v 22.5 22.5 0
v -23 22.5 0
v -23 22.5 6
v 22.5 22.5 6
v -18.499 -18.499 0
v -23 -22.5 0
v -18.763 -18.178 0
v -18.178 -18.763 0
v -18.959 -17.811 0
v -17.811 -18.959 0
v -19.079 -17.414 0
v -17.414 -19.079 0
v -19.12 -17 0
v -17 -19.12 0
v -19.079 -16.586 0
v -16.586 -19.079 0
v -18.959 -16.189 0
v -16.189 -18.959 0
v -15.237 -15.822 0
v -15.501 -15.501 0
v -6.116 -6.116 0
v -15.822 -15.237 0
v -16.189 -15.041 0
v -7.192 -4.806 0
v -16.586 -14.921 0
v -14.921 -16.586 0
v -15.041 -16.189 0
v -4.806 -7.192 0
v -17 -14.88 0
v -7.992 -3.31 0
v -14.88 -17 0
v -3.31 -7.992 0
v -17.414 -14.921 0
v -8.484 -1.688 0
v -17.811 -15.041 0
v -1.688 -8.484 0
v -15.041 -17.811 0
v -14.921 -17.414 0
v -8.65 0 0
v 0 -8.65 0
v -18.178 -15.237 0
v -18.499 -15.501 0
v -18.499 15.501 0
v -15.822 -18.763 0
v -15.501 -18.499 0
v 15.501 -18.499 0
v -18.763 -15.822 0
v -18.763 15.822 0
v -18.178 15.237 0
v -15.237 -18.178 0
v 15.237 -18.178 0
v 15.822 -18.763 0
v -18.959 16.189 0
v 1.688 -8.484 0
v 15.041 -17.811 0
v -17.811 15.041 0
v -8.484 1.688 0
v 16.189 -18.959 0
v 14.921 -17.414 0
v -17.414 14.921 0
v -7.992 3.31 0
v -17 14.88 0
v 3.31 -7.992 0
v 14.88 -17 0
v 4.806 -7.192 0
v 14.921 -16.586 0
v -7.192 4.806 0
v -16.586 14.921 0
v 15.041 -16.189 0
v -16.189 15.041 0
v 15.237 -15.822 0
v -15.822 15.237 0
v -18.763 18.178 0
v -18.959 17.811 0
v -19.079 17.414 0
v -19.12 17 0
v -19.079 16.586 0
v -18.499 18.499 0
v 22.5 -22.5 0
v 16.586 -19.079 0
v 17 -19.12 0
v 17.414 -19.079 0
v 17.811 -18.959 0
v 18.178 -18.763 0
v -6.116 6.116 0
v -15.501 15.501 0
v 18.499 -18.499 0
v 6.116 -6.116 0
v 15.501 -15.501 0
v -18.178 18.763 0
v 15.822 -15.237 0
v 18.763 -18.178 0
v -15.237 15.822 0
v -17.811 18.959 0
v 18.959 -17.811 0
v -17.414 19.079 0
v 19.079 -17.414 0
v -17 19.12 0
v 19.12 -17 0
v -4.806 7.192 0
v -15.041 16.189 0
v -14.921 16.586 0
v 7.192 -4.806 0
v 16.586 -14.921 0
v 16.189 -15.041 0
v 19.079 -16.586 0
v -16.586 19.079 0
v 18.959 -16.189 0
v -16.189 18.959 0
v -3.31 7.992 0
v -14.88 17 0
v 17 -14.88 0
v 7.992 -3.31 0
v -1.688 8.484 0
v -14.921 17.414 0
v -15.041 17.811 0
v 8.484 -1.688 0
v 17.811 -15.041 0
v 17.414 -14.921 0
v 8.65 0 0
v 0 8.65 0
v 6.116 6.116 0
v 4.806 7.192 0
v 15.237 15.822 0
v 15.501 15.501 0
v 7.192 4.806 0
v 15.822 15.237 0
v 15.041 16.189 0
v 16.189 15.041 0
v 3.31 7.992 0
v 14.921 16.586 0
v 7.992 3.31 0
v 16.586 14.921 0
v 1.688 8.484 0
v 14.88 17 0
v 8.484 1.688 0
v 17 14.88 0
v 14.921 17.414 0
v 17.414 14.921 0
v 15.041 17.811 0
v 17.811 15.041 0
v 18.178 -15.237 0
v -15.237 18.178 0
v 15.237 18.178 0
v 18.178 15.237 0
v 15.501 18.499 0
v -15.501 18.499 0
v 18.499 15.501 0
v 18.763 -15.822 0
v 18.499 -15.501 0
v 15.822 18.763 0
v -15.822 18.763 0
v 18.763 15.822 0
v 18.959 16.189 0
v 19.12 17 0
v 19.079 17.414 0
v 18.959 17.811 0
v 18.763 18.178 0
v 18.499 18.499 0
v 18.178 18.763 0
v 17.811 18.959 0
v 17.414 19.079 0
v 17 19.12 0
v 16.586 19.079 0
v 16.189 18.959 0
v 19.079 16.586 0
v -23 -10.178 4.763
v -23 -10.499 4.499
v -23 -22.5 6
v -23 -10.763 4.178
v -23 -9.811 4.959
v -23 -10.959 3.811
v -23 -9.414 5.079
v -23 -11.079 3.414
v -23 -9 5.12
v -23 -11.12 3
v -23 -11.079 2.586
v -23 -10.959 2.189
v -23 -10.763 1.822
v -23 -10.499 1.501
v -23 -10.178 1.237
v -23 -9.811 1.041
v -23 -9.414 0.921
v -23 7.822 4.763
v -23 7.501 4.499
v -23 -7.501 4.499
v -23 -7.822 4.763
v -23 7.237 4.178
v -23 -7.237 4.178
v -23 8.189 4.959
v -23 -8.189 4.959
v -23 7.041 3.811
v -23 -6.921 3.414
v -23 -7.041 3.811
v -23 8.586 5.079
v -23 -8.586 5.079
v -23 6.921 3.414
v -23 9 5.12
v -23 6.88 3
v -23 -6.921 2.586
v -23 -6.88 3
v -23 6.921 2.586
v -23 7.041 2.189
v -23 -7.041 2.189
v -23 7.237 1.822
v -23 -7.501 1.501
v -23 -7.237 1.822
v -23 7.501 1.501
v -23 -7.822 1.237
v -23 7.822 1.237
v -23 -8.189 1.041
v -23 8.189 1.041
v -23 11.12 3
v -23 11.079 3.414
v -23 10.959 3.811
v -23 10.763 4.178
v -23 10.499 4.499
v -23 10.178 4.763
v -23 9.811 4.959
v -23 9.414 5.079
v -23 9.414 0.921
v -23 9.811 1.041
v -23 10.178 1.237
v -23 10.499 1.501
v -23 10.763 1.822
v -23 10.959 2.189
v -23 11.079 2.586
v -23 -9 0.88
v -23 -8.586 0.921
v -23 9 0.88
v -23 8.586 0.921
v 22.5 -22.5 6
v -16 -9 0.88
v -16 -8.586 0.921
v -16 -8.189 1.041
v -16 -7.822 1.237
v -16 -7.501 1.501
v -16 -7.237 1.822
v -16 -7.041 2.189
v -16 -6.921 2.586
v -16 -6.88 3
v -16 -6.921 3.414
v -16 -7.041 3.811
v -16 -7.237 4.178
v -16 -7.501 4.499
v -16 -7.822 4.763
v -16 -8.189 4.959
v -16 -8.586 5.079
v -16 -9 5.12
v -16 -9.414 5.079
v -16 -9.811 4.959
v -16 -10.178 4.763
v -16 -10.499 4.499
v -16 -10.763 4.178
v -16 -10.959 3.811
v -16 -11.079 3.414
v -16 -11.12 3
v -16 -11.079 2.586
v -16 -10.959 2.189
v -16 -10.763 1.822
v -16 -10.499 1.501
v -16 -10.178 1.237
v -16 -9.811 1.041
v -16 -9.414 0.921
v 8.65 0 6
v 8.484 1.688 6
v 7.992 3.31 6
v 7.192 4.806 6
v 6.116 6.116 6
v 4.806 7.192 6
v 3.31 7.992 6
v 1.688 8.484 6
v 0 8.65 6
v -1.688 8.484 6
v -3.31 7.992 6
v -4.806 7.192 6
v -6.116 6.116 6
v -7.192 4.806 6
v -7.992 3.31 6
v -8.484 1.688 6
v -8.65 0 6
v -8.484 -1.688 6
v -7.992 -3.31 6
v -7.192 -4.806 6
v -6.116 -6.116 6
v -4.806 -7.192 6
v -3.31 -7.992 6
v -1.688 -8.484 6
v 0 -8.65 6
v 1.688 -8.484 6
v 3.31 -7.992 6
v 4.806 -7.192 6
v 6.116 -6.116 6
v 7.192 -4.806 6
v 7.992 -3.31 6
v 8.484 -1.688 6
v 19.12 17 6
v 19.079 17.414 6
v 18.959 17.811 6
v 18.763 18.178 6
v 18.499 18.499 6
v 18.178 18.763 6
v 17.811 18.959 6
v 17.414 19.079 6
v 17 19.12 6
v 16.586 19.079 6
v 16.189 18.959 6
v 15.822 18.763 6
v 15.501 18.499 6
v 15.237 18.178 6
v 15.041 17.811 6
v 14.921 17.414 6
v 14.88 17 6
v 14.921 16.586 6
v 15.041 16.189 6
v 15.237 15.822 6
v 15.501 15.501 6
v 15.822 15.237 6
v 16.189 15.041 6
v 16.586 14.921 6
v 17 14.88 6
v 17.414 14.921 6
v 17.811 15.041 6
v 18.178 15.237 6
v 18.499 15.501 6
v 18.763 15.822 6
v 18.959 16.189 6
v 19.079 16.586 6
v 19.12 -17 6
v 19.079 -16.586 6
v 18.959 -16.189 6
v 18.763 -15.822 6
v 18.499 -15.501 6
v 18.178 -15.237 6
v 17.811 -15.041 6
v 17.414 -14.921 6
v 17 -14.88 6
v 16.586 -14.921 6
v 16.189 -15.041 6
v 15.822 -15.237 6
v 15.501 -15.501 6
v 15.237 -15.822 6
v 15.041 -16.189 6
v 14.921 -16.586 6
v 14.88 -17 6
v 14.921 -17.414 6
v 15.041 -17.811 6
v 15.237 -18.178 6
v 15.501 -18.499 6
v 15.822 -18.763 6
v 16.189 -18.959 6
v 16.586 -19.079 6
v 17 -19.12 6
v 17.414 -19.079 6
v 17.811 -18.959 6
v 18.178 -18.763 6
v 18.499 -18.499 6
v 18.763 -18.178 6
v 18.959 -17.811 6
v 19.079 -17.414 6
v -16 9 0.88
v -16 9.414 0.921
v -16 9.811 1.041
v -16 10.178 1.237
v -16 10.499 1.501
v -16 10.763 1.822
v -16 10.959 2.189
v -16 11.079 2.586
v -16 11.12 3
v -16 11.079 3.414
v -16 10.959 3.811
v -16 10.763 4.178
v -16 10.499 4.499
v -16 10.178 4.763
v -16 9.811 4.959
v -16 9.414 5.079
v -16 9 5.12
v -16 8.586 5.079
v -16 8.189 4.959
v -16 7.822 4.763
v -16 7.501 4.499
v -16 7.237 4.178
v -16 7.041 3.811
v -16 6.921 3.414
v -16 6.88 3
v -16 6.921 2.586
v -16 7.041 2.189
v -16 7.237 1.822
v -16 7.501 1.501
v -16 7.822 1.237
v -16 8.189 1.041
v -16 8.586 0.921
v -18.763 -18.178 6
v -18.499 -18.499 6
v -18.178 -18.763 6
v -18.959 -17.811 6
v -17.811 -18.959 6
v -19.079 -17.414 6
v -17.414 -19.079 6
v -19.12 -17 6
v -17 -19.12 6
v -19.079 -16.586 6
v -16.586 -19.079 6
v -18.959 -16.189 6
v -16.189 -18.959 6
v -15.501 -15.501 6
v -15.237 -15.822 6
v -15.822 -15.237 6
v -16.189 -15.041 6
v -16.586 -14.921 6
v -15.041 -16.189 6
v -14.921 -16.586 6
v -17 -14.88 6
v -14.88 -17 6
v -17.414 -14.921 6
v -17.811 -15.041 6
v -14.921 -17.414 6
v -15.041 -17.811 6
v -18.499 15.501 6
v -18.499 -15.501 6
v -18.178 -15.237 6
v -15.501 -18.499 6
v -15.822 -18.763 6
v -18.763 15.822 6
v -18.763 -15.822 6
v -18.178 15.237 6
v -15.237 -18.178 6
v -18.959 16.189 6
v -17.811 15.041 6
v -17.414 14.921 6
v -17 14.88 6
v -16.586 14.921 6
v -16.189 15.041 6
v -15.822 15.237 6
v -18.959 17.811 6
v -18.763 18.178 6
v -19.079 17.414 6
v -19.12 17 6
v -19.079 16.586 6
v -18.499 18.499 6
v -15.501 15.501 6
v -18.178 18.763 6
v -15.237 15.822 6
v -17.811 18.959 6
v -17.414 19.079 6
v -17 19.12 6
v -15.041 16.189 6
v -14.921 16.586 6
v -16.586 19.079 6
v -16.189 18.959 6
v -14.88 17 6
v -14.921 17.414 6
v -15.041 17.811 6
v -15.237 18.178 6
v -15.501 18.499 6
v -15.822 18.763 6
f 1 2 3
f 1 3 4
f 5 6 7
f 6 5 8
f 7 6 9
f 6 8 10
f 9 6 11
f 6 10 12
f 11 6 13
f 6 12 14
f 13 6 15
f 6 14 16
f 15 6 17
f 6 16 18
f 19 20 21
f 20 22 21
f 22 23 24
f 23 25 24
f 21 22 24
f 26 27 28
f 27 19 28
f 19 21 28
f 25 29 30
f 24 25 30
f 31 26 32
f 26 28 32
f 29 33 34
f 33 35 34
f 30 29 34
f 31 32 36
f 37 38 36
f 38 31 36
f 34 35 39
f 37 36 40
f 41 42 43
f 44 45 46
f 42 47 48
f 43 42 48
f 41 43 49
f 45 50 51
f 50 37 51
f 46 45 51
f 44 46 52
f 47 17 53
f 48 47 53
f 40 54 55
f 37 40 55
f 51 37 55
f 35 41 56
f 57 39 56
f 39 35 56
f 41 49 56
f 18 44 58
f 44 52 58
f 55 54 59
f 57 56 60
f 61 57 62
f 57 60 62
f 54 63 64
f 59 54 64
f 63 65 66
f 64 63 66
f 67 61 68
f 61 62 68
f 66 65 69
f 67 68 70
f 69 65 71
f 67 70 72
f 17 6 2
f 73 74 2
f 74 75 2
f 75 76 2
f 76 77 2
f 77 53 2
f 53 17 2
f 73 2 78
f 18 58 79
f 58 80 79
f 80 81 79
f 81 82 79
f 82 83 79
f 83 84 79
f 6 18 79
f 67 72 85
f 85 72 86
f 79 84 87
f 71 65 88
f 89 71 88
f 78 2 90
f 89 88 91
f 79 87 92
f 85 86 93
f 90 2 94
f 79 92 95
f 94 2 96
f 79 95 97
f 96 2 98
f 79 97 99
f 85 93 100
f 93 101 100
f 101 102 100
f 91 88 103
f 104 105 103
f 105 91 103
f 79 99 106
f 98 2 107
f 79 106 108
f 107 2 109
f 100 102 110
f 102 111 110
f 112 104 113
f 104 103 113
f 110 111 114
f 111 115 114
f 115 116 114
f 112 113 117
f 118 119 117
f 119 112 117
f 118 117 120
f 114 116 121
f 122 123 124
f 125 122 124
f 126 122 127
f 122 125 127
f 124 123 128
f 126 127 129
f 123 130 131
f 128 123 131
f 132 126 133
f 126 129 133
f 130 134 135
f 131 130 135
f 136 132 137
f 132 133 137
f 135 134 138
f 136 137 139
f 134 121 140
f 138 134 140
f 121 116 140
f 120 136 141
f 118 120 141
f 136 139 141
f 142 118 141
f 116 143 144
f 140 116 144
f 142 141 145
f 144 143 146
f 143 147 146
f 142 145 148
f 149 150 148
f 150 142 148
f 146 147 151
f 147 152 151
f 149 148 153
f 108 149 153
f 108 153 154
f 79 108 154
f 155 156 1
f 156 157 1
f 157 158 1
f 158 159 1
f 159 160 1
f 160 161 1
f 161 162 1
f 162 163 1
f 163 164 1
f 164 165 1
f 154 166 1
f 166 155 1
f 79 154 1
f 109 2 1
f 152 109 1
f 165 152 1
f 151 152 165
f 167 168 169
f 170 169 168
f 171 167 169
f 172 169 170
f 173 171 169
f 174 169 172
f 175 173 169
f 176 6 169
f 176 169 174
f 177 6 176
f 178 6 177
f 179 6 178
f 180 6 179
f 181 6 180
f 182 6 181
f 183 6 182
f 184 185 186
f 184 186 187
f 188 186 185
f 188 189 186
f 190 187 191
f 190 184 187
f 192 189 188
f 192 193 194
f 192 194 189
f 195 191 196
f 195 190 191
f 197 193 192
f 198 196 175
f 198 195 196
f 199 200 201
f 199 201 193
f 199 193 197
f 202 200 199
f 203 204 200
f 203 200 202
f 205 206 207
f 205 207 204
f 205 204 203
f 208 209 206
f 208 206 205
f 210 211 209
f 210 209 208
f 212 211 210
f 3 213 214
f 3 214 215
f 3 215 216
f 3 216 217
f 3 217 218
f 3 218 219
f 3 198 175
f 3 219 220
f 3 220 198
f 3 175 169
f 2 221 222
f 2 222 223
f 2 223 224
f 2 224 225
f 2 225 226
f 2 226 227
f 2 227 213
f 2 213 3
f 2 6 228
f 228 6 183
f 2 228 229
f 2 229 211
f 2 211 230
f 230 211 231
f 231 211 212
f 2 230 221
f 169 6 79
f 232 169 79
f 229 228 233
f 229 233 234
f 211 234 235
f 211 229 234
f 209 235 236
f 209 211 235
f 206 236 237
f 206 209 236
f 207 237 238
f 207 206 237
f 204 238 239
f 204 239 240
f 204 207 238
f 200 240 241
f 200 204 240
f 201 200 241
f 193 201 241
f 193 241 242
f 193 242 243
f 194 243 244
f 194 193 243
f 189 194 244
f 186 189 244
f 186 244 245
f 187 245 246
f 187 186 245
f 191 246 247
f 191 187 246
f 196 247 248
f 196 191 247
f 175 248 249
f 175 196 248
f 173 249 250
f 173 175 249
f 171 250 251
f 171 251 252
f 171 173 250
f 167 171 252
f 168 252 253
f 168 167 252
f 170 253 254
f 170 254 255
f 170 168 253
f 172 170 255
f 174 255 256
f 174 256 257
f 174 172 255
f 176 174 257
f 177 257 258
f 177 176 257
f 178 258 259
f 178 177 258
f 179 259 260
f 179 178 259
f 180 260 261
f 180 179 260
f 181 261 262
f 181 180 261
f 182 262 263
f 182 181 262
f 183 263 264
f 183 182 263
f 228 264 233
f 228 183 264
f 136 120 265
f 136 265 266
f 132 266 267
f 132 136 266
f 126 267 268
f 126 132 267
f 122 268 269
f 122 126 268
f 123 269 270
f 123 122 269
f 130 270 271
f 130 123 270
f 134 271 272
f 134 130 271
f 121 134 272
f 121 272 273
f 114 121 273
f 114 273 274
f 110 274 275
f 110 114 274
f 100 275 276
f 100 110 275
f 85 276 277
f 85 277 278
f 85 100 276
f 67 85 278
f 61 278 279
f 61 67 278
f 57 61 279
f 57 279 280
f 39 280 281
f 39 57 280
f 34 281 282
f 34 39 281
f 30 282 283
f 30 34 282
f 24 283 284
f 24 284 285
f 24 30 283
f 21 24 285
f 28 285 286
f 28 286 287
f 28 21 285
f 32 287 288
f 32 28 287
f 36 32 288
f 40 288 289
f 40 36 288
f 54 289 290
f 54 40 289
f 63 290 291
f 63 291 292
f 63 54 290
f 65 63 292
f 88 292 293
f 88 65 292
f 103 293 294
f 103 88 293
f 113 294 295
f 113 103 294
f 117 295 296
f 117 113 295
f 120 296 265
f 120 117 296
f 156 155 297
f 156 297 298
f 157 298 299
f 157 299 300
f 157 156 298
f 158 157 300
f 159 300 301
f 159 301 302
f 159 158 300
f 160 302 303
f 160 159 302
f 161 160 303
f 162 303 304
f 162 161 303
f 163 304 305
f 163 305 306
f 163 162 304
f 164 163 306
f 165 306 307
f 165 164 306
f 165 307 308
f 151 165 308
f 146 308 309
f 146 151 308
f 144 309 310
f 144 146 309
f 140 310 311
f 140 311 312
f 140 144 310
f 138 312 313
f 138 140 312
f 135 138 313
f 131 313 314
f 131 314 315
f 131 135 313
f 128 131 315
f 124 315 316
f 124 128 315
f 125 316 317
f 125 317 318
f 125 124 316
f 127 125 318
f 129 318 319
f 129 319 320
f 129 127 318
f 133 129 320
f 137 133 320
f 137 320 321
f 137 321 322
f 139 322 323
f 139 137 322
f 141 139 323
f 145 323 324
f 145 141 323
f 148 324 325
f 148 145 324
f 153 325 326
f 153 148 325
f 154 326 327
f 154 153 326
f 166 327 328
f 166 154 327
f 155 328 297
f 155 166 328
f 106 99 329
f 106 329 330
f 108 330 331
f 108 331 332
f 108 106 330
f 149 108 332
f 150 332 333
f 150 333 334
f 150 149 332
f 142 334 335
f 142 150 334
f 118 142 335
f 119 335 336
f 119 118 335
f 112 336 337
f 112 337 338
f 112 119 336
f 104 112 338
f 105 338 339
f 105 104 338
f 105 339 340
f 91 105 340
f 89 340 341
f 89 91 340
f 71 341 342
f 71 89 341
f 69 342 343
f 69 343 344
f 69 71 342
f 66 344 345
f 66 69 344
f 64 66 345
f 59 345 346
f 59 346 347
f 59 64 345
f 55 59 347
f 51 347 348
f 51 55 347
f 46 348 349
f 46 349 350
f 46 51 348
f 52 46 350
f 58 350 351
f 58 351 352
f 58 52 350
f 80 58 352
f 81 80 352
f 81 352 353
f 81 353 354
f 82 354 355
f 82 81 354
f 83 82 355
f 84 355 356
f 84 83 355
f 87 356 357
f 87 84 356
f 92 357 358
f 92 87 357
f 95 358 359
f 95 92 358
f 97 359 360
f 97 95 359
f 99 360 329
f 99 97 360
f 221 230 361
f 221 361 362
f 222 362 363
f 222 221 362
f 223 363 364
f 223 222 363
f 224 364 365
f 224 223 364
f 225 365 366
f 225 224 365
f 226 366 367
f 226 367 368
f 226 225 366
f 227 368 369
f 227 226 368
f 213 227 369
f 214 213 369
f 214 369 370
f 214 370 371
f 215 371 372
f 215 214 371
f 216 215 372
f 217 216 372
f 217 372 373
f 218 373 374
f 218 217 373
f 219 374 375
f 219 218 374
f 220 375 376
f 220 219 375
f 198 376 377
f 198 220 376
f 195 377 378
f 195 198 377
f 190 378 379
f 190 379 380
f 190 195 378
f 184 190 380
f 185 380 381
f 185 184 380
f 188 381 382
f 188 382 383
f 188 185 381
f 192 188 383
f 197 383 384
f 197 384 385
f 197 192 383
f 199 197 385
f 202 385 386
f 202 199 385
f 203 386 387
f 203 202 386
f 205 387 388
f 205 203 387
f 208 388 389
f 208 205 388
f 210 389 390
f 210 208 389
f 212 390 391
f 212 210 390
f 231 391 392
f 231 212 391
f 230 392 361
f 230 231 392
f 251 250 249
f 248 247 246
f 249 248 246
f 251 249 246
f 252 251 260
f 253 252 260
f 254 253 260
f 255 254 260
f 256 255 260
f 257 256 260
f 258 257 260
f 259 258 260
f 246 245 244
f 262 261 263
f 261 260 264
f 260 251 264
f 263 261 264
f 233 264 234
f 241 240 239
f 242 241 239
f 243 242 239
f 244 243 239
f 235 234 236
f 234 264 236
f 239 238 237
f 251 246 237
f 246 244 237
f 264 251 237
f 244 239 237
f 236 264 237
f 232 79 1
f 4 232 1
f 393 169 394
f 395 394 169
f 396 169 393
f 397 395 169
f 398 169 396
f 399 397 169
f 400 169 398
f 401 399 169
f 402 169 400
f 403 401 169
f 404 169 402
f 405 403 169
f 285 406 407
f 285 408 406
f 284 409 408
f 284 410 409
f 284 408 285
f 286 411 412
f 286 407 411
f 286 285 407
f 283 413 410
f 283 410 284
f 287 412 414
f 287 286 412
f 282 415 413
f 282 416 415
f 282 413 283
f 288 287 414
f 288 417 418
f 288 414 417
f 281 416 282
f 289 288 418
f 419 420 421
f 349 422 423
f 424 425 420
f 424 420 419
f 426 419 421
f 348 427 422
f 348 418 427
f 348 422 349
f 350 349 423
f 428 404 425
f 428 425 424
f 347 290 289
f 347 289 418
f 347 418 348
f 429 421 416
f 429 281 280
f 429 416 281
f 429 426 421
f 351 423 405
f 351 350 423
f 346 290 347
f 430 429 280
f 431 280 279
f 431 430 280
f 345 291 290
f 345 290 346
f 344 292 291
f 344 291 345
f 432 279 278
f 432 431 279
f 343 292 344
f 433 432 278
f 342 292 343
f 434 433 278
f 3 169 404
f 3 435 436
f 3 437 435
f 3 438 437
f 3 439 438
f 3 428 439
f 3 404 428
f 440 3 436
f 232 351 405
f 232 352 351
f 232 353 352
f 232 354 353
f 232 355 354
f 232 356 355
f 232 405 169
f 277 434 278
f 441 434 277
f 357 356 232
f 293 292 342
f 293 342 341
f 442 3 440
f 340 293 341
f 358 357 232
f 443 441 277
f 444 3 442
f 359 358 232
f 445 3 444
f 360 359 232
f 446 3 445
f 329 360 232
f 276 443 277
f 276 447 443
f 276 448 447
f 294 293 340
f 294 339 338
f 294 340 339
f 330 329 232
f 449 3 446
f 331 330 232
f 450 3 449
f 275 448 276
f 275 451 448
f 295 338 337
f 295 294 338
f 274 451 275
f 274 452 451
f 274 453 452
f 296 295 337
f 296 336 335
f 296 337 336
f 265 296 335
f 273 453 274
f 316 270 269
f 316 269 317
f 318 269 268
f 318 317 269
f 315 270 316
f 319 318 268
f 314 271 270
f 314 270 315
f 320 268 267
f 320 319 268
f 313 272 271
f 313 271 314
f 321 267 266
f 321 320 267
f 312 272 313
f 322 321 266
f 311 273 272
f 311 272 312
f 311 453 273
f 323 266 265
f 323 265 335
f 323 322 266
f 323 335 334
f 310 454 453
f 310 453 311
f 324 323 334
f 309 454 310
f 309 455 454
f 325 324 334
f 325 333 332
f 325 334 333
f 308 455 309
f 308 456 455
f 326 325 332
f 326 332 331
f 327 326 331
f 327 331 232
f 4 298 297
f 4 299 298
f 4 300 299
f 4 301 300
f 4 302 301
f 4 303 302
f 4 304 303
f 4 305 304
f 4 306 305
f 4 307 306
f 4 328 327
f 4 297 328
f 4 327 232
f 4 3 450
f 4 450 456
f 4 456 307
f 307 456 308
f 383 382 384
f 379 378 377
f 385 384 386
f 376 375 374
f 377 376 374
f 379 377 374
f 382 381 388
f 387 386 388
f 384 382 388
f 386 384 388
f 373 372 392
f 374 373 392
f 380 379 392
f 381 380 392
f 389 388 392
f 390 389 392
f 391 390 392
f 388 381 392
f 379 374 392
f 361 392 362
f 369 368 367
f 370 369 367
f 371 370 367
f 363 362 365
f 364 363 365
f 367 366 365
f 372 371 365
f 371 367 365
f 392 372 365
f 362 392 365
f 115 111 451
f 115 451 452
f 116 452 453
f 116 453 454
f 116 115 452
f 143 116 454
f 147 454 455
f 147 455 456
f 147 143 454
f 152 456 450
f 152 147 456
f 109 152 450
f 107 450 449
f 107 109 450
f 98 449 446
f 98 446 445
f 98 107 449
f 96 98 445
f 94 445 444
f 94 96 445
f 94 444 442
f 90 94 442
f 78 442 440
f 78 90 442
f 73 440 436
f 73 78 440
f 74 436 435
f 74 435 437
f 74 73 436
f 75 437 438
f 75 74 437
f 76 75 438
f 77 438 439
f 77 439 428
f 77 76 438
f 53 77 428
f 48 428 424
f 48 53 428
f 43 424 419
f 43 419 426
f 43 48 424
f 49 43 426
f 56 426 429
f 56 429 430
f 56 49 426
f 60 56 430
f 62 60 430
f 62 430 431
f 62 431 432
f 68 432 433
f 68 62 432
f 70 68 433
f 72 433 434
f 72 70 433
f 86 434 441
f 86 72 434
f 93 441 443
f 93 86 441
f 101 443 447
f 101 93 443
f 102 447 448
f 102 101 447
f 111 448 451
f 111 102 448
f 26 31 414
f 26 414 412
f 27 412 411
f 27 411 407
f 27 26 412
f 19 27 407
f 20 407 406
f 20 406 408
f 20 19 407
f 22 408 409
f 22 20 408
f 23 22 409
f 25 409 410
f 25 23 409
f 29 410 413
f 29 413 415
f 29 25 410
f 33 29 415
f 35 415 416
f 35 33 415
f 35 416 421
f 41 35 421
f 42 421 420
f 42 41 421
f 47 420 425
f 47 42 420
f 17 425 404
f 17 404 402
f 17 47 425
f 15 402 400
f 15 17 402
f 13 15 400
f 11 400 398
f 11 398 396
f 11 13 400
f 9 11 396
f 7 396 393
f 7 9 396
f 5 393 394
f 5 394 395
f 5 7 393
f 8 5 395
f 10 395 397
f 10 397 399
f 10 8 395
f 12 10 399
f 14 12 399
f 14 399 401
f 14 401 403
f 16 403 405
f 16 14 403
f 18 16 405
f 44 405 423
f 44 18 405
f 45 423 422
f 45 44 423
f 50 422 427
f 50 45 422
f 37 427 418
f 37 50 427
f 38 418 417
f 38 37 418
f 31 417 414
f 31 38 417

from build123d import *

# Parameters (mm, degrees)
SKETCH1_W                                     = 45.5
SKETCH1_H                                     = 45
SKETCH1_R                                     = 8.65
SKETCH1_R_2                                   = 2.12
SIX_MM_HEAD_PLATE_BOLTS_TO_34_MM_SQUARE_DEPTH = 6
MOUNTING_START                                = -23
SKETCH2_R                                     = 2.12
MOUNTING_TOE_TAPPED_FROM_BOTTOM_DEPTH         = 7


with BuildPart() as part:
    # Sketch1 → Six mm head plate bolts to 34 mm square pattern (new body)
    with BuildSketch(Plane.XY):
        with Locations((-0.25, 0)):
            Rectangle(SKETCH1_W, SKETCH1_H)
        Circle(SKETCH1_R, mode=Mode.SUBTRACT)
        with Locations((-17, -17)):
            Circle(SKETCH1_R_2, mode=Mode.SUBTRACT)
        with Locations((-17, 17)):
            Circle(SKETCH1_R_2, mode=Mode.SUBTRACT)
        with Locations((17, -17)):
            Circle(SKETCH1_R_2, mode=Mode.SUBTRACT)
        with Locations((17, 17)):
            Circle(SKETCH1_R_2, mode=Mode.SUBTRACT)
    extrude(amount=SIX_MM_HEAD_PLATE_BOLTS_TO_34_MM_SQUARE_DEPTH)

    # Sketch2 → Mounting toe tapped from bottom (cut)
    with BuildSketch(Plane(origin=(0, 0, 0), x_dir=(0, 0, -1), z_dir=(1, 0, 0)).offset(MOUNTING_START)):
        with Locations((-3, -9)):
            Circle(SKETCH2_R)
        with Locations((-3, 9)):
            Circle(SKETCH2_R)
    extrude(amount=MOUNTING_TOE_TAPPED_FROM_BOTTOM_DEPTH, mode=Mode.SUBTRACT)


solid = part.part
